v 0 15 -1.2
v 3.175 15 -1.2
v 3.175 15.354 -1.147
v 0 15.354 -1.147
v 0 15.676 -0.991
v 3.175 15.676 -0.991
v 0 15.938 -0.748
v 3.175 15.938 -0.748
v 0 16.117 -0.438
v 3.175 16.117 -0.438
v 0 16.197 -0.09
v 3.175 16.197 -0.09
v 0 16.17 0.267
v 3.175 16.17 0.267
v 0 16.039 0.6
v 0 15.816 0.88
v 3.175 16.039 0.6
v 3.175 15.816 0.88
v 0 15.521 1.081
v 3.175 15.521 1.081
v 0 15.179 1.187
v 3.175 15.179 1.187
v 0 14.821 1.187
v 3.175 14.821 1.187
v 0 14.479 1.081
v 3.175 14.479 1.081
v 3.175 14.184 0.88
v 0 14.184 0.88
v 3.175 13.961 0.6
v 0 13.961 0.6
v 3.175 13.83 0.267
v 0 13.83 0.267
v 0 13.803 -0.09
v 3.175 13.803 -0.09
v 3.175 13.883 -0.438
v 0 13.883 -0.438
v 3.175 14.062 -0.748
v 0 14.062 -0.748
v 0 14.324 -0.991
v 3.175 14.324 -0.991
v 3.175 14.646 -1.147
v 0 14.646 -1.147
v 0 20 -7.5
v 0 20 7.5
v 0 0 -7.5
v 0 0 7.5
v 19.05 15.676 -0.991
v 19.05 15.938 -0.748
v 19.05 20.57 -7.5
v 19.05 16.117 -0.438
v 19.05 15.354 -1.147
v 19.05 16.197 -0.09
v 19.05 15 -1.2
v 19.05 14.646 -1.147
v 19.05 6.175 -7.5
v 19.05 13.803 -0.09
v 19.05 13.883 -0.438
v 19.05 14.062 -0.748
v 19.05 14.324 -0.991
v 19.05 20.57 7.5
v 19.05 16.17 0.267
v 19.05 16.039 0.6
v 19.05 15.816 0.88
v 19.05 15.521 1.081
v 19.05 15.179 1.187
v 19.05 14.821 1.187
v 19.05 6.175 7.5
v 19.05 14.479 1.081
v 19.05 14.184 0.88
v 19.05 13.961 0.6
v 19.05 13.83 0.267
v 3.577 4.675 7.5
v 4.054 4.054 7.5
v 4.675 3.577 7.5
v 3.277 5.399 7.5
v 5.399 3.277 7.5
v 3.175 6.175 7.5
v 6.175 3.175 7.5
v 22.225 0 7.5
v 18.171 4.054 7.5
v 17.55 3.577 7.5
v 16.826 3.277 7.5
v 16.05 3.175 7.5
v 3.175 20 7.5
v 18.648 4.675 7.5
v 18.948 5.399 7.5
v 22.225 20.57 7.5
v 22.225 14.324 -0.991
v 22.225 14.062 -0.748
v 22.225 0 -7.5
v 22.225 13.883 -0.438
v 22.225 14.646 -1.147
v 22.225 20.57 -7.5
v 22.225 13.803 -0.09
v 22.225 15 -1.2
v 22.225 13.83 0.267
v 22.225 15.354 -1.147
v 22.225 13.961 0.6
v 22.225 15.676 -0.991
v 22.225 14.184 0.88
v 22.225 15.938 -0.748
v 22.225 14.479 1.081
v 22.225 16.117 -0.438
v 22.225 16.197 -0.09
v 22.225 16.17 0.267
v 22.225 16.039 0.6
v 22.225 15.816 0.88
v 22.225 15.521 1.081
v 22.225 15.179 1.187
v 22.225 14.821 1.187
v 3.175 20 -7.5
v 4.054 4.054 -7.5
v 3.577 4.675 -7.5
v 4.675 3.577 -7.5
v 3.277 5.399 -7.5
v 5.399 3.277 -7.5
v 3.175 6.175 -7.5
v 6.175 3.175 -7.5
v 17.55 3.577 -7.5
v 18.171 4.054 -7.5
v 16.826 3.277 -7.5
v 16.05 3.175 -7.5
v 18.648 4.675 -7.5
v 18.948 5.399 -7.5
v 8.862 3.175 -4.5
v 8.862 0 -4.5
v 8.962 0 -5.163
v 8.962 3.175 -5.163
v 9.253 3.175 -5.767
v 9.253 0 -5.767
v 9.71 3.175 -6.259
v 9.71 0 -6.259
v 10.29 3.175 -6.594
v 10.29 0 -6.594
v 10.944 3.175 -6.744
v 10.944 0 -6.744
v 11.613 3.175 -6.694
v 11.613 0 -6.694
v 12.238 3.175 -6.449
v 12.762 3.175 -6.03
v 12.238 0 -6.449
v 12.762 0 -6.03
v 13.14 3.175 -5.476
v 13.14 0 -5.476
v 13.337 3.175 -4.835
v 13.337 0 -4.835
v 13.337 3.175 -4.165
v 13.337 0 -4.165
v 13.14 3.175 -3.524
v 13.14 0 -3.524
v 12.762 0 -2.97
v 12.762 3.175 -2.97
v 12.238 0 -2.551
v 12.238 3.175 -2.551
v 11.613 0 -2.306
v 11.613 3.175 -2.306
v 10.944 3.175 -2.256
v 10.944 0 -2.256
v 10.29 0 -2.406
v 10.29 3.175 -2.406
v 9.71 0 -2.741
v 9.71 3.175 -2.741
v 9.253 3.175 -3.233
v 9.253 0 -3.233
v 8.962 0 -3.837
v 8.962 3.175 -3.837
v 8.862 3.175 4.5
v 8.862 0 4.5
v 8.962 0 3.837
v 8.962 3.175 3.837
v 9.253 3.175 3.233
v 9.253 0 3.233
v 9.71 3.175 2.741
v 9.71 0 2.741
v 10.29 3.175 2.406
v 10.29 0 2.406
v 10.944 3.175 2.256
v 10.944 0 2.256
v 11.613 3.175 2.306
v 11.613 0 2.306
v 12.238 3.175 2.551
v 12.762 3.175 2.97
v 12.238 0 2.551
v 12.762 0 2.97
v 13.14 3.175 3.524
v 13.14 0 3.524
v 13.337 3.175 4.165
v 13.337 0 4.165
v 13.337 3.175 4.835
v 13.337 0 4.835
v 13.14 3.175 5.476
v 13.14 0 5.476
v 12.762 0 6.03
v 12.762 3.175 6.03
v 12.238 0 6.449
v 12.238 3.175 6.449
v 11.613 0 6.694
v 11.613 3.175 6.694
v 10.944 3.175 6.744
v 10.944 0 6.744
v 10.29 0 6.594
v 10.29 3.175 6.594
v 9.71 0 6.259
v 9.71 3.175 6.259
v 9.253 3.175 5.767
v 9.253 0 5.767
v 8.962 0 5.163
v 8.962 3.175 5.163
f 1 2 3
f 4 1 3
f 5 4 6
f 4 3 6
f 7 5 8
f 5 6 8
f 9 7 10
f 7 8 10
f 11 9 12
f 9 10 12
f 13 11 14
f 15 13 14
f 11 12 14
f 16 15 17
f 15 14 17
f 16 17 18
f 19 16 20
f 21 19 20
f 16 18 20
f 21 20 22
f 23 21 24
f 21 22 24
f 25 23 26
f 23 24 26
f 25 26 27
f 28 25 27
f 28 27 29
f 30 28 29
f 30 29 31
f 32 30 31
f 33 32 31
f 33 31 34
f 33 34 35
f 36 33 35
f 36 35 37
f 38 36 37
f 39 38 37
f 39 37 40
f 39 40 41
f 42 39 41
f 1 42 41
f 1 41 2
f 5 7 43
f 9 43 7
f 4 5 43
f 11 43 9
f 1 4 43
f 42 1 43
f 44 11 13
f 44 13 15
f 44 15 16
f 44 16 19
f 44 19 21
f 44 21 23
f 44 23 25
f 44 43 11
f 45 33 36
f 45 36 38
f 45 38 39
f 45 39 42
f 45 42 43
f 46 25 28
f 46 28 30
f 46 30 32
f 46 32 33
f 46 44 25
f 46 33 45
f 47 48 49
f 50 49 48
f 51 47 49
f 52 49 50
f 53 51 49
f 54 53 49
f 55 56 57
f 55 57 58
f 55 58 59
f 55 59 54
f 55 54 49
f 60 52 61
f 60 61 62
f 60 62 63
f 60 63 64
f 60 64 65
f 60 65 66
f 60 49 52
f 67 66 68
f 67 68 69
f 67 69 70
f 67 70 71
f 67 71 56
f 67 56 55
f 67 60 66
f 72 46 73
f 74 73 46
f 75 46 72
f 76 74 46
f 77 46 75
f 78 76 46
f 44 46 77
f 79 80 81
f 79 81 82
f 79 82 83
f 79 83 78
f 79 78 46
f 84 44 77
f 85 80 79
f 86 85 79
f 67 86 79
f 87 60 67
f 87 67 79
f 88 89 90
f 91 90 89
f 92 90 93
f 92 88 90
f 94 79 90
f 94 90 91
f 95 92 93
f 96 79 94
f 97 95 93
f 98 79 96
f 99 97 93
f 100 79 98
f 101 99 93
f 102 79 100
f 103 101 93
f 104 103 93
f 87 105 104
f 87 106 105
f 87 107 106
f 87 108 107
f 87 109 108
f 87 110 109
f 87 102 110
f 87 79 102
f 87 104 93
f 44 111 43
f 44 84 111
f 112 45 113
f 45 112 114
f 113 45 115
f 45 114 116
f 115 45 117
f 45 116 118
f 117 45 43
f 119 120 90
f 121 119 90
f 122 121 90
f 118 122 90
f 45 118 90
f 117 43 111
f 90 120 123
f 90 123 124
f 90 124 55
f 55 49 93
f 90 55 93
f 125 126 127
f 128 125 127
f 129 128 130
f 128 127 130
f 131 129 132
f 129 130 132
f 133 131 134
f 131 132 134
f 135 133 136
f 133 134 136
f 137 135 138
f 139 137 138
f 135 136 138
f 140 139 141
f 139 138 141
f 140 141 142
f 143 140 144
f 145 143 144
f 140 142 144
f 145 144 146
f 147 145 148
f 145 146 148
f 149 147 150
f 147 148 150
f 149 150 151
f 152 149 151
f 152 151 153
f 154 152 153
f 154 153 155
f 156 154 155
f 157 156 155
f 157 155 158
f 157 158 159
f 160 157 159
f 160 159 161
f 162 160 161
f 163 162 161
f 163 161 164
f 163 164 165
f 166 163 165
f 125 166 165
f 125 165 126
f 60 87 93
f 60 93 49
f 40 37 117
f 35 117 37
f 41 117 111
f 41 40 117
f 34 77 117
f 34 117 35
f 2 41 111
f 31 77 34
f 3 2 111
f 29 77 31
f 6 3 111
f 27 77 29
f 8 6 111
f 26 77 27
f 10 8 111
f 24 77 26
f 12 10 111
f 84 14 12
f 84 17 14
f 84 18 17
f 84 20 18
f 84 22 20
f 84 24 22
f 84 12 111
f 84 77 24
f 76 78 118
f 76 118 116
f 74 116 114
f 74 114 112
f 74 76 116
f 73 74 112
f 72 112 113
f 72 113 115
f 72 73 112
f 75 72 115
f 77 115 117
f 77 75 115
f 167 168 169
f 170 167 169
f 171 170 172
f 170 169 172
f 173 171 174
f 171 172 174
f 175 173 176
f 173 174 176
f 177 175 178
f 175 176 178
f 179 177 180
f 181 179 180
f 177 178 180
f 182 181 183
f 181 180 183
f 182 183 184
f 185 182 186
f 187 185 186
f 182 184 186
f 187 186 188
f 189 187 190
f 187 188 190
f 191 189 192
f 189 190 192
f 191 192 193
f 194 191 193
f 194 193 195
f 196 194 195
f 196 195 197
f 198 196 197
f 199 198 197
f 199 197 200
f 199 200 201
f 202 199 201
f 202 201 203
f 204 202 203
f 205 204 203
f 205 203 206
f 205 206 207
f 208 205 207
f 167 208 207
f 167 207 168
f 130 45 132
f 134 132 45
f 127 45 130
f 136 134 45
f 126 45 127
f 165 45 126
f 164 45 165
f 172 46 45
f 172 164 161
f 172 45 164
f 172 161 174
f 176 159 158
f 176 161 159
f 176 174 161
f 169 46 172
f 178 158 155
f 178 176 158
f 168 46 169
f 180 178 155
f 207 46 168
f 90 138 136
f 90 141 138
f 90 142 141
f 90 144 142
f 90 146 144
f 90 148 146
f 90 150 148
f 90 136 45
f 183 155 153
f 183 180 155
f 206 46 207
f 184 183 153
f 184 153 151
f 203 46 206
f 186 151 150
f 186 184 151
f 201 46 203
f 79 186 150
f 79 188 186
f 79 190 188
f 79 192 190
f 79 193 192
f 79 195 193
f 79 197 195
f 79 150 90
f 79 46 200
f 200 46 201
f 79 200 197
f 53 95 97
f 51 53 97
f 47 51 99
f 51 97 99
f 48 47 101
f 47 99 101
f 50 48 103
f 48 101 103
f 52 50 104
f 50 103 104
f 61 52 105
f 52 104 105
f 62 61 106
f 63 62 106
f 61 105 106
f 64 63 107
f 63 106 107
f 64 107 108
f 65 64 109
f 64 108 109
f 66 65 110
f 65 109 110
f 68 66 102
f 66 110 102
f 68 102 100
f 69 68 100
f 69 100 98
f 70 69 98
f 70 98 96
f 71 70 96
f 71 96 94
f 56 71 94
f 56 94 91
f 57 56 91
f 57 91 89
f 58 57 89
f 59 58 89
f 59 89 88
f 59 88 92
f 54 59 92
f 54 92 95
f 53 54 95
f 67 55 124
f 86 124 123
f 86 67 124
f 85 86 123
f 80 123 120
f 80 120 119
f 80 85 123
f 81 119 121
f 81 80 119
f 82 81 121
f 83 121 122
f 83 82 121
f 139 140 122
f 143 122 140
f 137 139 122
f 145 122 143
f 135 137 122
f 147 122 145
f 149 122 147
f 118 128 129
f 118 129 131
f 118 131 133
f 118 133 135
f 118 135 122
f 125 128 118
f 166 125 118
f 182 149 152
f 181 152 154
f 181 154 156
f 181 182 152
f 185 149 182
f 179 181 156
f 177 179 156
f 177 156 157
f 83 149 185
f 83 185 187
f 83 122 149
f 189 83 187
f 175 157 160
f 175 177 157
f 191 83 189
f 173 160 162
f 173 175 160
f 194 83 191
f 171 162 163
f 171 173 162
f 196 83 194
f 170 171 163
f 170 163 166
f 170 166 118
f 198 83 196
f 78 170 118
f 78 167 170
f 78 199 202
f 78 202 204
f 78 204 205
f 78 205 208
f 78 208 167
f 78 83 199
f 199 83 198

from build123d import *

# Parameters (mm, degrees)
BOSS_EXTRUDE1_DEPTH  = 7.5
M4_CLEARANCE_HOLE1_D = 4.5
M2_CLEARANCE_HOLE1_D = 2.4


with BuildPart() as part:
    # Sketch1 → Boss-Extrude1 (new body, symmetric)
    with BuildSketch(Plane.XY):
        with BuildLine():
            Line((0, 0), (22.225, 0))
            Line((22.225, 0), (22.225, 20.569946809))
            Line((22.225, 20.569946809), (19.05, 20.569946809))
            Line((19.05, 20.569946809), (19.05, 6.175))
            ThreePointArc((19.05, 6.175), (18.171320344, 4.053679656), (16.05, 3.175))
            Line((16.05, 3.175), (6.175, 3.175))
            ThreePointArc((6.175, 3.175), (4.053679656, 4.053679656), (3.175, 6.175))
            Line((3.175, 6.175), (3.175, 20))
            Line((3.175, 20), (0, 20))
            Line((0, 20), (0, 0))
        make_face()
    extrude(amount=BOSS_EXTRUDE1_DEPTH, both=True)

    # M4 Clearance Hole1 (through all)
    with Locations(Plane(origin=(0, 3.175, 0), x_dir=(1, 0, 0), z_dir=(0, 1, 0))):
        with Locations((11.1125, -4.5), (11.1125, 4.5)):
            Hole(M4_CLEARANCE_HOLE1_D / 2)

    # M2 Clearance Hole1 (through all)
    with Locations(Plane.ZY):
        with Locations((0, 15)):
            Hole(M2_CLEARANCE_HOLE1_D / 2)


solid = part.part
